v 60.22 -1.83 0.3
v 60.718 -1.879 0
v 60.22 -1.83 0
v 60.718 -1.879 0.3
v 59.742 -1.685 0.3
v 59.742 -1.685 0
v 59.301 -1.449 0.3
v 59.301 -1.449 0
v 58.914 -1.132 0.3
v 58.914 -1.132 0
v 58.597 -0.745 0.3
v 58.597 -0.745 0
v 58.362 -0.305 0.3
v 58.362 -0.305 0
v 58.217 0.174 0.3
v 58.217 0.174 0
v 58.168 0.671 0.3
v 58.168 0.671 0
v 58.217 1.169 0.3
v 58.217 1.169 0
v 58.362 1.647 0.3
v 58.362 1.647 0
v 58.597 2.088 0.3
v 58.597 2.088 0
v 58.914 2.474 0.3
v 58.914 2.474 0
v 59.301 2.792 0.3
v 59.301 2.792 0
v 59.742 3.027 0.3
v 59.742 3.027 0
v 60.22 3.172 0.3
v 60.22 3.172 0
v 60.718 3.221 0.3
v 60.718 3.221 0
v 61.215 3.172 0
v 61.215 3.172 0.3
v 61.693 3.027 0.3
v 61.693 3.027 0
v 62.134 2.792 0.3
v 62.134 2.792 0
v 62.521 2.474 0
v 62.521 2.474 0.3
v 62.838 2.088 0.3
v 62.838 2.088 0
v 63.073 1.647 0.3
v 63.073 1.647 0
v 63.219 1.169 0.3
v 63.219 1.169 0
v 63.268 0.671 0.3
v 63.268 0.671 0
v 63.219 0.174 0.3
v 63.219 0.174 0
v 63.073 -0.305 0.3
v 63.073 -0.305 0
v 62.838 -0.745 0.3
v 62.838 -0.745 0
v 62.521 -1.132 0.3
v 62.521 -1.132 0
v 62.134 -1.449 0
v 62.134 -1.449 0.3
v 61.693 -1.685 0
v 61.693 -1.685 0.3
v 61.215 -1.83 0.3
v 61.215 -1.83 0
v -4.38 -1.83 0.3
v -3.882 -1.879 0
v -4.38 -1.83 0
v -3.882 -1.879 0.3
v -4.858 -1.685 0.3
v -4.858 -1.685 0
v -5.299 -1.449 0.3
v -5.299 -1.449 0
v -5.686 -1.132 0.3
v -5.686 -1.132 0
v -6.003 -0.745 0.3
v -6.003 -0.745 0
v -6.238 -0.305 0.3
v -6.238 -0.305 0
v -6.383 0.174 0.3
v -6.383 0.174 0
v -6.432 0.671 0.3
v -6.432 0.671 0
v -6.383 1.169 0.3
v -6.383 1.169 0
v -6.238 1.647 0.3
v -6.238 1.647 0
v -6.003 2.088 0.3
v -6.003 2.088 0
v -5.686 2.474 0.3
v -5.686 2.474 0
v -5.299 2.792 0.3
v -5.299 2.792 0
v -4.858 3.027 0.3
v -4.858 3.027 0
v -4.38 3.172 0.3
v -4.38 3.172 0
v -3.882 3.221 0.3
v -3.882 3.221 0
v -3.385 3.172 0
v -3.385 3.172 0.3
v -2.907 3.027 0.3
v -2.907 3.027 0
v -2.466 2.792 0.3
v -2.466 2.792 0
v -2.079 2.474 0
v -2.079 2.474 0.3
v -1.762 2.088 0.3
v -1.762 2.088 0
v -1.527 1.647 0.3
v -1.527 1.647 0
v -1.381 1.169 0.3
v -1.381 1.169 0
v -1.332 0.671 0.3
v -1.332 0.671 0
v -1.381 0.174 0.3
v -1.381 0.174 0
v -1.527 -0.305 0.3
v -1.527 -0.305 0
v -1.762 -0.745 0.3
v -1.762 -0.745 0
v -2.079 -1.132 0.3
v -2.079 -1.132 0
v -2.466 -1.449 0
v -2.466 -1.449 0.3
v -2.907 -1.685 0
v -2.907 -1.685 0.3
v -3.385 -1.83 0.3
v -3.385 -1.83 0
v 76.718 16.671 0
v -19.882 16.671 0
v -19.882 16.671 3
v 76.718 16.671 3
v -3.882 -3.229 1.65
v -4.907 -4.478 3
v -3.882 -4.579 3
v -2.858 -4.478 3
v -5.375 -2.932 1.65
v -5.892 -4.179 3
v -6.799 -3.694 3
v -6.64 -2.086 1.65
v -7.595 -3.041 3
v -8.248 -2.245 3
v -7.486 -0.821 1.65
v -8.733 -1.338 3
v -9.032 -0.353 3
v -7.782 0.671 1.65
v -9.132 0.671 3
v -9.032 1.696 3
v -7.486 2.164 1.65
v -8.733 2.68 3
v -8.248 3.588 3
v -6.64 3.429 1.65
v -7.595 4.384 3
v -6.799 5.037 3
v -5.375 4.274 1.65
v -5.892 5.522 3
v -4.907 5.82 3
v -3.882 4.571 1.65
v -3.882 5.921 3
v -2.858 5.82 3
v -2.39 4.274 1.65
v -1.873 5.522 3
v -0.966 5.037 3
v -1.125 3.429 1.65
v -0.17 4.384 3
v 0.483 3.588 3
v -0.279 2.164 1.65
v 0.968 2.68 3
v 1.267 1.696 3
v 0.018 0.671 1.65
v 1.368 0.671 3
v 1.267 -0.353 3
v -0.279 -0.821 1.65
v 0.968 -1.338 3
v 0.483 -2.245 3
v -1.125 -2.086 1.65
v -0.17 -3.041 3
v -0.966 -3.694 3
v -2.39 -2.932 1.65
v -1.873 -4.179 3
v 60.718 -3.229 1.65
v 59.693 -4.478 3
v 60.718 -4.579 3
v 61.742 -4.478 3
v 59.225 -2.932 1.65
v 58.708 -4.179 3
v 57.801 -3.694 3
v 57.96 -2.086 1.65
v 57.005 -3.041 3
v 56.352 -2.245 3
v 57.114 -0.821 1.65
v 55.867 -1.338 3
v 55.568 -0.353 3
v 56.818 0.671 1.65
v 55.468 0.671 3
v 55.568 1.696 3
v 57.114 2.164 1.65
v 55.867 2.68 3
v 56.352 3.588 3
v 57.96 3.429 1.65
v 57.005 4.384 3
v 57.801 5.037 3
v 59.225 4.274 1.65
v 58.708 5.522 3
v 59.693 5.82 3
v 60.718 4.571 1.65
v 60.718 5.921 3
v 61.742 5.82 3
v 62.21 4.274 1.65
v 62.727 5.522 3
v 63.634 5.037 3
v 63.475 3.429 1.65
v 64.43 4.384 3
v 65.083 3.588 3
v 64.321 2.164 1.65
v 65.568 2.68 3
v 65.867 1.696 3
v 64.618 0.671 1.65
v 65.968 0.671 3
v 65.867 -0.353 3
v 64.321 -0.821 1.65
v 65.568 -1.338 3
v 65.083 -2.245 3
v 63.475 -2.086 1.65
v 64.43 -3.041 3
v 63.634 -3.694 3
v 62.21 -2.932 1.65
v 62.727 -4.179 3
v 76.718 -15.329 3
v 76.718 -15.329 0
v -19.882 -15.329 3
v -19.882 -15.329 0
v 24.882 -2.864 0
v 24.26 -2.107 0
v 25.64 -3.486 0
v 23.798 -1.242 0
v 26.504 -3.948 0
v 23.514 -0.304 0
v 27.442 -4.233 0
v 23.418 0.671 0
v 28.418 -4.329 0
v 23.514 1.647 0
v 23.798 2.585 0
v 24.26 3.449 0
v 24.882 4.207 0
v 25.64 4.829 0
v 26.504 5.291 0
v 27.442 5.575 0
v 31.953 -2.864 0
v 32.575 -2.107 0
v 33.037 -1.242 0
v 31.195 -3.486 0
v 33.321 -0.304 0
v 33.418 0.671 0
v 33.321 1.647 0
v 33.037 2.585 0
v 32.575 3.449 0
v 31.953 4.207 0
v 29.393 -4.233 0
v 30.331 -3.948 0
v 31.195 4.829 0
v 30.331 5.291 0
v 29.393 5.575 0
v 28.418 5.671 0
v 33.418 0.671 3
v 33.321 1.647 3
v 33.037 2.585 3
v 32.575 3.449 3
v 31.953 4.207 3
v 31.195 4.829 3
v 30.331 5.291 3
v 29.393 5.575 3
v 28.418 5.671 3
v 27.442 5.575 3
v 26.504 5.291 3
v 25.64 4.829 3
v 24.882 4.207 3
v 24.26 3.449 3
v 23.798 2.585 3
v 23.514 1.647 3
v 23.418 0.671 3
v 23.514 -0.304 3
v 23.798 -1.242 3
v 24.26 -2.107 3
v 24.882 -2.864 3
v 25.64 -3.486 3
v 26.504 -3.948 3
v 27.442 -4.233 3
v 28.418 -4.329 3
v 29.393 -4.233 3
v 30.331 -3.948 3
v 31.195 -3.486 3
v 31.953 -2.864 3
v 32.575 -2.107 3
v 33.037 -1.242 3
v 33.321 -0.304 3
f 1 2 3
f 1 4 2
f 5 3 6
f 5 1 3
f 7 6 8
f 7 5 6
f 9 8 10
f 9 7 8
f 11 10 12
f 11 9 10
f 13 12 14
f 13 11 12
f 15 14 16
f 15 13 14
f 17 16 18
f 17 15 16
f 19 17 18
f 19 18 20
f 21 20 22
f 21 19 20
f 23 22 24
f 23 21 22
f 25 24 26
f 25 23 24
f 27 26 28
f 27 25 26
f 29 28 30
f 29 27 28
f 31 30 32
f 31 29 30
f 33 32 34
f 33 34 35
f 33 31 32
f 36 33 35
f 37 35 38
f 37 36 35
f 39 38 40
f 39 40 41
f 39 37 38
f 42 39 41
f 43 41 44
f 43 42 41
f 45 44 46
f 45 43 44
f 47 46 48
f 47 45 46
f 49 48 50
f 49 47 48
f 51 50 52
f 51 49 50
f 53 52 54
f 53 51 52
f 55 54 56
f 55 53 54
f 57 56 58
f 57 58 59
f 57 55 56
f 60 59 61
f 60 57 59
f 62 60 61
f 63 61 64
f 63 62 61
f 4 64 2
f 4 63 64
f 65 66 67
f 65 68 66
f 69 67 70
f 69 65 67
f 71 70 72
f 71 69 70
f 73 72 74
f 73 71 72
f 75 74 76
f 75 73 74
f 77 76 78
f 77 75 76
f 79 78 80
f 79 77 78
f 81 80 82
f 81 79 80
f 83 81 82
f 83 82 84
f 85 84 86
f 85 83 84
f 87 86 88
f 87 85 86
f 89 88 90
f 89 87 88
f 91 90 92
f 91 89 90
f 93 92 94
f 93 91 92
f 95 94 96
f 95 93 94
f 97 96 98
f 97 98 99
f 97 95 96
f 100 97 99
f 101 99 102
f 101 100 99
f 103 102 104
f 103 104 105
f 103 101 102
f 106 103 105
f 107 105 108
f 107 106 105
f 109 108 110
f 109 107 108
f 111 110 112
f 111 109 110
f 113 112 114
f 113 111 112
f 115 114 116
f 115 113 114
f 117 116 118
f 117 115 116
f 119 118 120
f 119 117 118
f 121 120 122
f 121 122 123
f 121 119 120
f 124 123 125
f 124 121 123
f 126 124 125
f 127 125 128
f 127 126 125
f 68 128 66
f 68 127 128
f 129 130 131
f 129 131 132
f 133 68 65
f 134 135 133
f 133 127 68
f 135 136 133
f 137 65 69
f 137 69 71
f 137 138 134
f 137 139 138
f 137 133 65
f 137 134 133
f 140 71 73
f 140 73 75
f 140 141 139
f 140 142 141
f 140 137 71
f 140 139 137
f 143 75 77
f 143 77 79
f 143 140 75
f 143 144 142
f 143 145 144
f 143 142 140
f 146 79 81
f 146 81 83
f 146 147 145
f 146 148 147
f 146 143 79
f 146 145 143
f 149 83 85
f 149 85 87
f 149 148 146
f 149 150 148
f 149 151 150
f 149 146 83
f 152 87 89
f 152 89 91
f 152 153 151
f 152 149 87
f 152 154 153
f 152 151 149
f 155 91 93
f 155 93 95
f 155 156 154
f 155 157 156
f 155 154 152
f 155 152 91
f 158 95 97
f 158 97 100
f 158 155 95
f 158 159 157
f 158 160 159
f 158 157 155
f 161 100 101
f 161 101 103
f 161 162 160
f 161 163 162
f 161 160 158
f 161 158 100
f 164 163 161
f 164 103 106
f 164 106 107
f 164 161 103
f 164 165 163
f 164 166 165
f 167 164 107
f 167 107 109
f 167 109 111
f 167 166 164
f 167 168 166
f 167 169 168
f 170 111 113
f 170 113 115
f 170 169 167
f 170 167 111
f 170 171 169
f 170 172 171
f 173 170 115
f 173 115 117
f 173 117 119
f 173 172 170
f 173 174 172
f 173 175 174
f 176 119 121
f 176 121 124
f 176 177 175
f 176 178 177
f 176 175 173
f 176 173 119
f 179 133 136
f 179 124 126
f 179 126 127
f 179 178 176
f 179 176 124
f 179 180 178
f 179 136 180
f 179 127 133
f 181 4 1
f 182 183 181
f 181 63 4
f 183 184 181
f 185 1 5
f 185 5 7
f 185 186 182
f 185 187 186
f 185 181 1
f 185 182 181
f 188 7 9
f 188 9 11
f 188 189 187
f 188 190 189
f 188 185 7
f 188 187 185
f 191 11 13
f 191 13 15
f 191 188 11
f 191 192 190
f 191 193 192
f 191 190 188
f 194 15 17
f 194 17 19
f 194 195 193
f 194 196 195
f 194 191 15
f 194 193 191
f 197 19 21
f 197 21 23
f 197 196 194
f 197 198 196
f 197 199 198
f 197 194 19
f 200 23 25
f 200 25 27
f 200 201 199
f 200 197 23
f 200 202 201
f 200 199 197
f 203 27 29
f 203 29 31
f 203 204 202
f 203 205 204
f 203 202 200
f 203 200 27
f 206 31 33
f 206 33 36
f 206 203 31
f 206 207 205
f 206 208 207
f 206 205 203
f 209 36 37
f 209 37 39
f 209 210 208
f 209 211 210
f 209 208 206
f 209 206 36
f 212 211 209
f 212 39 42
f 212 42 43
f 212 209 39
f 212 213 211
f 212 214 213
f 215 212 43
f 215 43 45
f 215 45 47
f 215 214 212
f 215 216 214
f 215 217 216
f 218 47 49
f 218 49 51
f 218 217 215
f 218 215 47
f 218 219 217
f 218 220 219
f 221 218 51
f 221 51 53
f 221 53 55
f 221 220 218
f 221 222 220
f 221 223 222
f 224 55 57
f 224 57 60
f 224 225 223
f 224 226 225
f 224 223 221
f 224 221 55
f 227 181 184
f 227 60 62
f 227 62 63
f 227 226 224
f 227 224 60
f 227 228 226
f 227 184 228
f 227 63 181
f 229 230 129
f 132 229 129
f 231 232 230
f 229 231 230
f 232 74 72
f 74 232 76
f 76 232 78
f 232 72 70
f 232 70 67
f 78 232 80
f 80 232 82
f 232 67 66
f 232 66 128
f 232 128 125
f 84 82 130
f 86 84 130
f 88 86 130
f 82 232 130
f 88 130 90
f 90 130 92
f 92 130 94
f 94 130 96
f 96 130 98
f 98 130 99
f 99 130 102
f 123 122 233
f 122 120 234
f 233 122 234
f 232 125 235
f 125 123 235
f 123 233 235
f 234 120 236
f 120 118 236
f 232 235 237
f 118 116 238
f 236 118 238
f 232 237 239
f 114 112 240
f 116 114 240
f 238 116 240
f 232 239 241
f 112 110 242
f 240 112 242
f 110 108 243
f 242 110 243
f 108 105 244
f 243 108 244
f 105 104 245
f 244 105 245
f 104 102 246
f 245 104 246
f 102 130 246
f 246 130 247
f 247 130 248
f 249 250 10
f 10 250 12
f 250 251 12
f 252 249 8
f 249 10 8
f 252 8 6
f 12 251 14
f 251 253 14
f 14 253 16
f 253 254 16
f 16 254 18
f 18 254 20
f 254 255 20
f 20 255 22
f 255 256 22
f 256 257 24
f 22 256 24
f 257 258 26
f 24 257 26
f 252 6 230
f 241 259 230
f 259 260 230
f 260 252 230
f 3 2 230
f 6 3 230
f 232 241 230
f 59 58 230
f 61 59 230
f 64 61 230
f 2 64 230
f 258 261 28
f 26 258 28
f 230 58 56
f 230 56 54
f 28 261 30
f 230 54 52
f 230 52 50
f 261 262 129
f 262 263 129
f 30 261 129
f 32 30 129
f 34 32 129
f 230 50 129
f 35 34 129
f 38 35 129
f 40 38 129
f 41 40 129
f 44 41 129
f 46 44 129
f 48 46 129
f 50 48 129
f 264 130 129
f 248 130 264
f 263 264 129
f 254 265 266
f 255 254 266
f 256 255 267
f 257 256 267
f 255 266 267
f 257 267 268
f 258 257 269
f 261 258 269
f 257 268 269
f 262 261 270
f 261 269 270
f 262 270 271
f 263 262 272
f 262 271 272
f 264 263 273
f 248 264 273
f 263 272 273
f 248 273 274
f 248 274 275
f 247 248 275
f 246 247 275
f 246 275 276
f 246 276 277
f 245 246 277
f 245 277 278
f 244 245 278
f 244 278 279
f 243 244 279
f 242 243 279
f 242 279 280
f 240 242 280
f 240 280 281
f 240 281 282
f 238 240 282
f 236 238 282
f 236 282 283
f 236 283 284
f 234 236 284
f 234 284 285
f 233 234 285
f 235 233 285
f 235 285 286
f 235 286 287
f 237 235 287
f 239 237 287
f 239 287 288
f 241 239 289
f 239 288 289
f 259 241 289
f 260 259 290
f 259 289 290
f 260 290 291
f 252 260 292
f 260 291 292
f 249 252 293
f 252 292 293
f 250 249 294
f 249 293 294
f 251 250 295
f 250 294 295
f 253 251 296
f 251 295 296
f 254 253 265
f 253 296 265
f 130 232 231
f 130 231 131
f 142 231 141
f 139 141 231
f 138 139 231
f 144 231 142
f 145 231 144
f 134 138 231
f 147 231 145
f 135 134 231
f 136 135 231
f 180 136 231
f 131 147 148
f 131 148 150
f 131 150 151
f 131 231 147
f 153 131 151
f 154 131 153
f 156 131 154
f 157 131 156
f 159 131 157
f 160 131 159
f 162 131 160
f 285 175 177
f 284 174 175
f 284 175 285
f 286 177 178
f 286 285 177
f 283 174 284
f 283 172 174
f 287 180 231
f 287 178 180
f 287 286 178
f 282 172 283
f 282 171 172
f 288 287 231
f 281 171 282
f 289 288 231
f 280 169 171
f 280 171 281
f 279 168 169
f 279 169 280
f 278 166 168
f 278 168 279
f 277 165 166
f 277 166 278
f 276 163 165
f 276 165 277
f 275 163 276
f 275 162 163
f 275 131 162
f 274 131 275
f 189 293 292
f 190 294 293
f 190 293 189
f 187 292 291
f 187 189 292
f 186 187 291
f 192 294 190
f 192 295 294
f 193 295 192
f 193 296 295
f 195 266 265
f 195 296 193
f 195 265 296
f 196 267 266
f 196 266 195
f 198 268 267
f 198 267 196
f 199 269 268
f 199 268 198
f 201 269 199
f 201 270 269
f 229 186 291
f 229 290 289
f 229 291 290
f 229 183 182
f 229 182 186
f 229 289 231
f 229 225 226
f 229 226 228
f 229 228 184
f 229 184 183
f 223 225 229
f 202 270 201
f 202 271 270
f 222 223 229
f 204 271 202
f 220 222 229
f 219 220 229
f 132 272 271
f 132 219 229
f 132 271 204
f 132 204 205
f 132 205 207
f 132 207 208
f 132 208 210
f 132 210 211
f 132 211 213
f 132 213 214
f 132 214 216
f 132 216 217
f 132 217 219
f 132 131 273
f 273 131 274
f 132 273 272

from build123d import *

# Parameters (mm, degrees)
SKETCH1_W                                  = 96.6
SKETCH1_H                                  = 32
BOSS_EXTRUDE1_DEPTH                        = 3
SKETCH2_R                                  = 5
CUT_EXTRUDE1_DEPTH                         = 79.565348097
FRAISAGE_POUR_VIS_T_TE_FRAIS_E_BOM_2_COUNT = 2
FRAISAGE_POUR_VIS_T_TE_FRAIS_E_BOM_2_PITCH = 64.6


with BuildPart() as part:
    # Sketch1 → Boss-Extrude1 (new body)
    with BuildSketch(Plane.XY):
        with Locations((28.417538555, 0.671328671)):
            Rectangle(SKETCH1_W, SKETCH1_H)
    extrude(amount=BOSS_EXTRUDE1_DEPTH)

    # Sketch2 → Cut-Extrude1 (cut, through all)
    with BuildSketch(Plane.XY.offset(3)):
        with Locations((28.417538555, 0.671328671)):
            Circle(SKETCH2_R)
    extrude(amount=-CUT_EXTRUDE1_DEPTH, mode=Mode.SUBTRACT)

    # Esquisse3 → Fraisage pour vis à tête fraisée bombée #51 (revolve, cut)
    with BuildSketch(Plane(origin=(-3.882461445, 0.671328671, 3), x_dir=(0, -1, 0), z_dir=(1, 0, 0))):
        Polygon((0, 0), (0, 3), (2.54999998, 3), (2.54999998, 2.700000061), (5.250000041, 0), align=None)
    fraisage_pour_vis_t_te_frais_e_bomb_e = revolve(axis=Axis((-3.882461445, 0.671328671, 9.35), (0, 0, -1)), mode=Mode.SUBTRACT)

    # Fraisage pour vis _ t_te frais_e bom 2: Fraisage pour vis à tête fraisée bombée #51 ×2
    with Locations(*[(i * FRAISAGE_POUR_VIS_T_TE_FRAIS_E_BOM_2_PITCH, 0, 0) for i in range(1, FRAISAGE_POUR_VIS_T_TE_FRAIS_E_BOM_2_COUNT)]):
        add(fraisage_pour_vis_t_te_frais_e_bomb_e, mode=Mode.SUBTRACT)


solid = part.part
